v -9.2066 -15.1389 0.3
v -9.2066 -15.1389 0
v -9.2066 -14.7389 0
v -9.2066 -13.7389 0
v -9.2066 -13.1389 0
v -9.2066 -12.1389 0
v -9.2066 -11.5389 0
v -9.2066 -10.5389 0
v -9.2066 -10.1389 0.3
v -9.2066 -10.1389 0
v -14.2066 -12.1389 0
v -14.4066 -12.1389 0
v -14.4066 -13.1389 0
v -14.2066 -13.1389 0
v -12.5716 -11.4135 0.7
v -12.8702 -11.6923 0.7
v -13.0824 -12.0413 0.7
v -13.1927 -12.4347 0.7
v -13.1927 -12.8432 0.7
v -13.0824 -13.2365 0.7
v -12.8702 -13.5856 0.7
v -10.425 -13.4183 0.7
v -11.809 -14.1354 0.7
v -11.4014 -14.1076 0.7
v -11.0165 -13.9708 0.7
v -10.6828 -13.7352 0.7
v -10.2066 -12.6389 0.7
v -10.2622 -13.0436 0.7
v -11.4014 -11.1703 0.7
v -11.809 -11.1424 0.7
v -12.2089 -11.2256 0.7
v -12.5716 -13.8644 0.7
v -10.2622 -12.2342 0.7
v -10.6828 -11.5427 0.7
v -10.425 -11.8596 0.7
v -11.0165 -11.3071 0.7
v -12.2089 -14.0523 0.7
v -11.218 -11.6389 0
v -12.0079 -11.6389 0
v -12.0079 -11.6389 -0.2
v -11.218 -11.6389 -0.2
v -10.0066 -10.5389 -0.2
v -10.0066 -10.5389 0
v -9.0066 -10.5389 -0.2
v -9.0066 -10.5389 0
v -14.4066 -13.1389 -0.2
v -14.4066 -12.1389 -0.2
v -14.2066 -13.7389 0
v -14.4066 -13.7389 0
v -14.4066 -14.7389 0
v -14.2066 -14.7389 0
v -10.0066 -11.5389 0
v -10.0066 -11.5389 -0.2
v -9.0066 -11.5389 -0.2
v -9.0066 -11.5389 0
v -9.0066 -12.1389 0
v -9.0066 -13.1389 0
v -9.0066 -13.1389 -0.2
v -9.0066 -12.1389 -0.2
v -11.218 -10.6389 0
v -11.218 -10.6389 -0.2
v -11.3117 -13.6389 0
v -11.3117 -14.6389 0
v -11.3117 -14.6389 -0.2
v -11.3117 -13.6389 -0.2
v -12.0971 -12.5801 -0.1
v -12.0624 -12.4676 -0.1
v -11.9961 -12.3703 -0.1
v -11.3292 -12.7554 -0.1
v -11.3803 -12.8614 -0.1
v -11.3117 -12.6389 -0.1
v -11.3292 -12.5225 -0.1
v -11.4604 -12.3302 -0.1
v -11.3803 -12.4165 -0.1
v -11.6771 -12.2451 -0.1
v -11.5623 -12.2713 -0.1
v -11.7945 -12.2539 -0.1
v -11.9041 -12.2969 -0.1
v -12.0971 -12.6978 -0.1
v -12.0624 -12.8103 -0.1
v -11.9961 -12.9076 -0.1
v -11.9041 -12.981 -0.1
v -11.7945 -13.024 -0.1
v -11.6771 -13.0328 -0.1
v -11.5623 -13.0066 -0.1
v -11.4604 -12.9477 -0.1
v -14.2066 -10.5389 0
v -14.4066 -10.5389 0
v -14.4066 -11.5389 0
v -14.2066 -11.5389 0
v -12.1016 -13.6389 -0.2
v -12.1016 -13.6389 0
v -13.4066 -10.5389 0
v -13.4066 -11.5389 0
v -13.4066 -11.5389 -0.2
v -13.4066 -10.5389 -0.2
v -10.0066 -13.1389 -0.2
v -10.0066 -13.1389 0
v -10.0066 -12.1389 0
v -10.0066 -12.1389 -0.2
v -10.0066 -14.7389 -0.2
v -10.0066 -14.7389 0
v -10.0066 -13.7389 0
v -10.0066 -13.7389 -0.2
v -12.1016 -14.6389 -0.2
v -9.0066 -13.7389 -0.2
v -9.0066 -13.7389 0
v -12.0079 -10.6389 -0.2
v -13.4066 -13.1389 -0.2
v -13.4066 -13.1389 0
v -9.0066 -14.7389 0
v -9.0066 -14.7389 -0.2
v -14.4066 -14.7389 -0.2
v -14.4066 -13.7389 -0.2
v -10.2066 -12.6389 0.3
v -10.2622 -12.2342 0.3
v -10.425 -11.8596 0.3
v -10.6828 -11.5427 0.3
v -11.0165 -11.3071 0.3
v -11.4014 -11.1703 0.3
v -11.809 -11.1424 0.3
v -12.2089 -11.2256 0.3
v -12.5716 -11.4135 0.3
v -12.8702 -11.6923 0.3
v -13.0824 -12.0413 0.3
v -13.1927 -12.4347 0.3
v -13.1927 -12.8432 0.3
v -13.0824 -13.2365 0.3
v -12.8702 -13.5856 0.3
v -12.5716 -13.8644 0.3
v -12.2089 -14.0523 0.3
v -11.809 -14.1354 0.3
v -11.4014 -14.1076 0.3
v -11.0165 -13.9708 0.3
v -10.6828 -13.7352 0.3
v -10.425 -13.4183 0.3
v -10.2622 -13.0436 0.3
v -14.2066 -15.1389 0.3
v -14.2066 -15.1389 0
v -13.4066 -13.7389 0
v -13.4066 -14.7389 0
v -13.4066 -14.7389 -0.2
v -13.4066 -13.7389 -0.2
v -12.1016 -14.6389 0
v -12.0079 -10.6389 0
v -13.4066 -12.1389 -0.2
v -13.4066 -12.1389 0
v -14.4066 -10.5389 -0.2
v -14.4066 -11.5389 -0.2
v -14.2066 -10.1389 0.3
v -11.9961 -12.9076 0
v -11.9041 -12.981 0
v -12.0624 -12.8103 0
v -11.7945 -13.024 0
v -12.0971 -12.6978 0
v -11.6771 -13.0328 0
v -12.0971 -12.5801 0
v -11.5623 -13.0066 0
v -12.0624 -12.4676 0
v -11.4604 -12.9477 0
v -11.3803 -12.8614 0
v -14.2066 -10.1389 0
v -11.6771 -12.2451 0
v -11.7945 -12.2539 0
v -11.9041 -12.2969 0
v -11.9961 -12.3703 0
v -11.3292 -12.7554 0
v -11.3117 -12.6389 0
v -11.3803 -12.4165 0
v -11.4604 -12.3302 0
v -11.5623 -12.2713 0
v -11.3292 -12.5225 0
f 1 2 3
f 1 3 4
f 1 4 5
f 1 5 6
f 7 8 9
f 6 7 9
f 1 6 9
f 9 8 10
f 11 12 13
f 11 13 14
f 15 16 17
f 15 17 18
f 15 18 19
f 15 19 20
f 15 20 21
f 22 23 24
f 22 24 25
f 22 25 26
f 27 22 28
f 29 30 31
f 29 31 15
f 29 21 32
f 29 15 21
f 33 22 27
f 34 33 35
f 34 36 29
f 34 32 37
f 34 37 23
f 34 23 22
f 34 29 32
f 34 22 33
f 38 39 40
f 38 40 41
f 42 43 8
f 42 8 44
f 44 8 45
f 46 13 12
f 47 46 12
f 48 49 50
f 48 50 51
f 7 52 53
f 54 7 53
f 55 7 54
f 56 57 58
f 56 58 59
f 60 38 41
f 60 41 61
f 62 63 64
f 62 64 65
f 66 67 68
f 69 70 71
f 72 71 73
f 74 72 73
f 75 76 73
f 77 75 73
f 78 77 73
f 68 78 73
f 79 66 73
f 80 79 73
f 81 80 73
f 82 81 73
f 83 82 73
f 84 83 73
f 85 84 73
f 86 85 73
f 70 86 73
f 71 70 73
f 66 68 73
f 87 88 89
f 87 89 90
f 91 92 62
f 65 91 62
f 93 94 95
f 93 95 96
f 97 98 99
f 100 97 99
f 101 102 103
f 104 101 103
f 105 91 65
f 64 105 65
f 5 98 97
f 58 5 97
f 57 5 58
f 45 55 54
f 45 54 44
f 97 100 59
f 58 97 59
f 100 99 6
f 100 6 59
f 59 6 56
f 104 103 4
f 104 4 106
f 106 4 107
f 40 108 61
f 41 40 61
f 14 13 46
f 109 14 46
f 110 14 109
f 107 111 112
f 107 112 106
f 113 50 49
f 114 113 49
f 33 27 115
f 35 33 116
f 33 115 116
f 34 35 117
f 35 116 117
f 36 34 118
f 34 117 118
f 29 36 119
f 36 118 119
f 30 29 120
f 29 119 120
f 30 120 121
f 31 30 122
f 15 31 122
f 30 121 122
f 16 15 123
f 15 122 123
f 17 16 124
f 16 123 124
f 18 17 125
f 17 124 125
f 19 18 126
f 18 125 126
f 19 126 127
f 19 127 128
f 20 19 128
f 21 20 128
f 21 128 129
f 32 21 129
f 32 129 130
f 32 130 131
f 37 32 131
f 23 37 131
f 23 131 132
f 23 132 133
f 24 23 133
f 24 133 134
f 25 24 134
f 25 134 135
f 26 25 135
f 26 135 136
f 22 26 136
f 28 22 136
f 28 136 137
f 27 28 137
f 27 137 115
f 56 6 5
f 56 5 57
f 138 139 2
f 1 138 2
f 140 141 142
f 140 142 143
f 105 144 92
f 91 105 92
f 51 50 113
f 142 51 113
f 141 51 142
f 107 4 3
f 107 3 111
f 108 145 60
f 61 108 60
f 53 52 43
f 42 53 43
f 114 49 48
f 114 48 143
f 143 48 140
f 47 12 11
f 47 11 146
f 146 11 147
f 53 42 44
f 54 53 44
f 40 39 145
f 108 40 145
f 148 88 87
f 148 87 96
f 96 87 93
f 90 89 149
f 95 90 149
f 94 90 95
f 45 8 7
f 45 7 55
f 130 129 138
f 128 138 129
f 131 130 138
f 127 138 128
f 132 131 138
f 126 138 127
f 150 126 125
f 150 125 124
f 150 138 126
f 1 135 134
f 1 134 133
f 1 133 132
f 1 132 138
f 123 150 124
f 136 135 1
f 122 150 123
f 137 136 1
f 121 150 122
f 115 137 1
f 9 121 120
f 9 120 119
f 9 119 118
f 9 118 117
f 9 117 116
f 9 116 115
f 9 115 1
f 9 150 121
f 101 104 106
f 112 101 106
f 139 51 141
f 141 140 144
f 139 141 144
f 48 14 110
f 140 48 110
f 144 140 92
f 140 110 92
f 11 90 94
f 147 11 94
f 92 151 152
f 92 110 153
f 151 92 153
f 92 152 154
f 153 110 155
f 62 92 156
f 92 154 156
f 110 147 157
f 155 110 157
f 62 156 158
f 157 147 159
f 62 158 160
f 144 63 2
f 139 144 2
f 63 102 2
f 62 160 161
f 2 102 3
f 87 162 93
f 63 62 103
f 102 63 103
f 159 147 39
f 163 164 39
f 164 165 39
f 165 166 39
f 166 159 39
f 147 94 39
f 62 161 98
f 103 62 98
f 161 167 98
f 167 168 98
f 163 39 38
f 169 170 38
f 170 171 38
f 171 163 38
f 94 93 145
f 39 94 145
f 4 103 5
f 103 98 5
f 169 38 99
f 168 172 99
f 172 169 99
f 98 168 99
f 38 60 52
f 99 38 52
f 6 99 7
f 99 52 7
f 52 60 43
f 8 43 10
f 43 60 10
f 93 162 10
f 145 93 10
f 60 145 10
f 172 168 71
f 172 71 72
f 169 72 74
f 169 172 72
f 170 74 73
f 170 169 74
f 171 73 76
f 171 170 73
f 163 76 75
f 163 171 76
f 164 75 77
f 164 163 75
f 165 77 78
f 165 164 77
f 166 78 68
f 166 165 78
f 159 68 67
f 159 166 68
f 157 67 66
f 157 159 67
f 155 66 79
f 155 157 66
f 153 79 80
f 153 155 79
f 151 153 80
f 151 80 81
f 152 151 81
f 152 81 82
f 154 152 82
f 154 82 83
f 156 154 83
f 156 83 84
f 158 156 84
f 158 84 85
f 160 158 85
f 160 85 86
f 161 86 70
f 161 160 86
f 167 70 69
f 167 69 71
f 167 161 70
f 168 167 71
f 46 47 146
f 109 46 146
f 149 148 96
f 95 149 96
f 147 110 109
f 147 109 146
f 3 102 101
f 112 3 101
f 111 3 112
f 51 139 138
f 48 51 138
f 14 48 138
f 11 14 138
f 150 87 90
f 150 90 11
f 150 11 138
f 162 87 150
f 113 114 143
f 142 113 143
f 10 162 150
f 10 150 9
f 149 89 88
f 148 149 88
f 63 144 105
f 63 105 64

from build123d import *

# Parameters (mm, degrees)
ESQUISSE1_W        = 5
ESQUISSE1_H        = 5
BOSS_EXTRU_2_DEPTH = 0.3
ESQUISSE1_5_R      = 1.5
BOSS_EXTRU_3_DEPTH = 0.7
ESQUISSE1_6_R      = 0.394936167
BOSS_EXTRU_4_DEPTH = 0.1
ESQUISSE1_7_W      = 1
ESQUISSE1_7_H      = 1
ESQUISSE1_7_W_2    = 0.789872334
BOSS_EXTRU_5_DEPTH = 0.2


with BuildPart() as part:
    # Esquisse1 → Boss.-Extru.2 (new body)
    with BuildSketch(Plane.XY):
        with Locations((-11.706621497, -12.638942011)):
            Rectangle(ESQUISSE1_W, ESQUISSE1_H)
    extrude(amount=BOSS_EXTRU_2_DEPTH)

    # Esquisse1<5> → Boss.-Extru.3 (add)
    with BuildSketch(Plane.XY):
        with Locations((-11.706621497, -12.638942011)):
            Circle(ESQUISSE1_5_R)
    extrude(amount=BOSS_EXTRU_3_DEPTH)

    # Esquisse1<6> → Boss.-Extru.4 (add)
    with BuildSketch(Plane.XY):
        with Locations((-11.706621497, -12.638942011)):
            Circle(ESQUISSE1_6_R)
    extrude(amount=-BOSS_EXTRU_4_DEPTH)

    # Esquisse1<7> → Boss.-Extru.5 (add)
    with BuildSketch(Plane.XY):
        with Locations((-13.906621497, -12.638942011)):
            Rectangle(ESQUISSE1_7_W, ESQUISSE1_7_H)
        with Locations((-11.612951228, -11.138942011)):
            Rectangle(ESQUISSE1_7_W_2, ESQUISSE1_7_H)
        with Locations((-11.706621497, -14.138942011)):
            Rectangle(ESQUISSE1_7_W_2, ESQUISSE1_7_H)
        with Locations((-13.906621497, -11.038942011)):
            Rectangle(ESQUISSE1_7_W, ESQUISSE1_7_H)
        with Locations((-13.906621497, -14.238942011)):
            Rectangle(ESQUISSE1_7_W, ESQUISSE1_7_H)
        with Locations((-9.506621497, -11.038942011)):
            Rectangle(ESQUISSE1_7_W, ESQUISSE1_7_H)
        with Locations((-9.506621497, -14.238942011)):
            Rectangle(ESQUISSE1_7_W, ESQUISSE1_7_H)
        with Locations((-9.506621497, -12.638942011)):
            Rectangle(ESQUISSE1_7_W, ESQUISSE1_7_H)
    extrude(amount=-BOSS_EXTRU_5_DEPTH)


solid = part.part
